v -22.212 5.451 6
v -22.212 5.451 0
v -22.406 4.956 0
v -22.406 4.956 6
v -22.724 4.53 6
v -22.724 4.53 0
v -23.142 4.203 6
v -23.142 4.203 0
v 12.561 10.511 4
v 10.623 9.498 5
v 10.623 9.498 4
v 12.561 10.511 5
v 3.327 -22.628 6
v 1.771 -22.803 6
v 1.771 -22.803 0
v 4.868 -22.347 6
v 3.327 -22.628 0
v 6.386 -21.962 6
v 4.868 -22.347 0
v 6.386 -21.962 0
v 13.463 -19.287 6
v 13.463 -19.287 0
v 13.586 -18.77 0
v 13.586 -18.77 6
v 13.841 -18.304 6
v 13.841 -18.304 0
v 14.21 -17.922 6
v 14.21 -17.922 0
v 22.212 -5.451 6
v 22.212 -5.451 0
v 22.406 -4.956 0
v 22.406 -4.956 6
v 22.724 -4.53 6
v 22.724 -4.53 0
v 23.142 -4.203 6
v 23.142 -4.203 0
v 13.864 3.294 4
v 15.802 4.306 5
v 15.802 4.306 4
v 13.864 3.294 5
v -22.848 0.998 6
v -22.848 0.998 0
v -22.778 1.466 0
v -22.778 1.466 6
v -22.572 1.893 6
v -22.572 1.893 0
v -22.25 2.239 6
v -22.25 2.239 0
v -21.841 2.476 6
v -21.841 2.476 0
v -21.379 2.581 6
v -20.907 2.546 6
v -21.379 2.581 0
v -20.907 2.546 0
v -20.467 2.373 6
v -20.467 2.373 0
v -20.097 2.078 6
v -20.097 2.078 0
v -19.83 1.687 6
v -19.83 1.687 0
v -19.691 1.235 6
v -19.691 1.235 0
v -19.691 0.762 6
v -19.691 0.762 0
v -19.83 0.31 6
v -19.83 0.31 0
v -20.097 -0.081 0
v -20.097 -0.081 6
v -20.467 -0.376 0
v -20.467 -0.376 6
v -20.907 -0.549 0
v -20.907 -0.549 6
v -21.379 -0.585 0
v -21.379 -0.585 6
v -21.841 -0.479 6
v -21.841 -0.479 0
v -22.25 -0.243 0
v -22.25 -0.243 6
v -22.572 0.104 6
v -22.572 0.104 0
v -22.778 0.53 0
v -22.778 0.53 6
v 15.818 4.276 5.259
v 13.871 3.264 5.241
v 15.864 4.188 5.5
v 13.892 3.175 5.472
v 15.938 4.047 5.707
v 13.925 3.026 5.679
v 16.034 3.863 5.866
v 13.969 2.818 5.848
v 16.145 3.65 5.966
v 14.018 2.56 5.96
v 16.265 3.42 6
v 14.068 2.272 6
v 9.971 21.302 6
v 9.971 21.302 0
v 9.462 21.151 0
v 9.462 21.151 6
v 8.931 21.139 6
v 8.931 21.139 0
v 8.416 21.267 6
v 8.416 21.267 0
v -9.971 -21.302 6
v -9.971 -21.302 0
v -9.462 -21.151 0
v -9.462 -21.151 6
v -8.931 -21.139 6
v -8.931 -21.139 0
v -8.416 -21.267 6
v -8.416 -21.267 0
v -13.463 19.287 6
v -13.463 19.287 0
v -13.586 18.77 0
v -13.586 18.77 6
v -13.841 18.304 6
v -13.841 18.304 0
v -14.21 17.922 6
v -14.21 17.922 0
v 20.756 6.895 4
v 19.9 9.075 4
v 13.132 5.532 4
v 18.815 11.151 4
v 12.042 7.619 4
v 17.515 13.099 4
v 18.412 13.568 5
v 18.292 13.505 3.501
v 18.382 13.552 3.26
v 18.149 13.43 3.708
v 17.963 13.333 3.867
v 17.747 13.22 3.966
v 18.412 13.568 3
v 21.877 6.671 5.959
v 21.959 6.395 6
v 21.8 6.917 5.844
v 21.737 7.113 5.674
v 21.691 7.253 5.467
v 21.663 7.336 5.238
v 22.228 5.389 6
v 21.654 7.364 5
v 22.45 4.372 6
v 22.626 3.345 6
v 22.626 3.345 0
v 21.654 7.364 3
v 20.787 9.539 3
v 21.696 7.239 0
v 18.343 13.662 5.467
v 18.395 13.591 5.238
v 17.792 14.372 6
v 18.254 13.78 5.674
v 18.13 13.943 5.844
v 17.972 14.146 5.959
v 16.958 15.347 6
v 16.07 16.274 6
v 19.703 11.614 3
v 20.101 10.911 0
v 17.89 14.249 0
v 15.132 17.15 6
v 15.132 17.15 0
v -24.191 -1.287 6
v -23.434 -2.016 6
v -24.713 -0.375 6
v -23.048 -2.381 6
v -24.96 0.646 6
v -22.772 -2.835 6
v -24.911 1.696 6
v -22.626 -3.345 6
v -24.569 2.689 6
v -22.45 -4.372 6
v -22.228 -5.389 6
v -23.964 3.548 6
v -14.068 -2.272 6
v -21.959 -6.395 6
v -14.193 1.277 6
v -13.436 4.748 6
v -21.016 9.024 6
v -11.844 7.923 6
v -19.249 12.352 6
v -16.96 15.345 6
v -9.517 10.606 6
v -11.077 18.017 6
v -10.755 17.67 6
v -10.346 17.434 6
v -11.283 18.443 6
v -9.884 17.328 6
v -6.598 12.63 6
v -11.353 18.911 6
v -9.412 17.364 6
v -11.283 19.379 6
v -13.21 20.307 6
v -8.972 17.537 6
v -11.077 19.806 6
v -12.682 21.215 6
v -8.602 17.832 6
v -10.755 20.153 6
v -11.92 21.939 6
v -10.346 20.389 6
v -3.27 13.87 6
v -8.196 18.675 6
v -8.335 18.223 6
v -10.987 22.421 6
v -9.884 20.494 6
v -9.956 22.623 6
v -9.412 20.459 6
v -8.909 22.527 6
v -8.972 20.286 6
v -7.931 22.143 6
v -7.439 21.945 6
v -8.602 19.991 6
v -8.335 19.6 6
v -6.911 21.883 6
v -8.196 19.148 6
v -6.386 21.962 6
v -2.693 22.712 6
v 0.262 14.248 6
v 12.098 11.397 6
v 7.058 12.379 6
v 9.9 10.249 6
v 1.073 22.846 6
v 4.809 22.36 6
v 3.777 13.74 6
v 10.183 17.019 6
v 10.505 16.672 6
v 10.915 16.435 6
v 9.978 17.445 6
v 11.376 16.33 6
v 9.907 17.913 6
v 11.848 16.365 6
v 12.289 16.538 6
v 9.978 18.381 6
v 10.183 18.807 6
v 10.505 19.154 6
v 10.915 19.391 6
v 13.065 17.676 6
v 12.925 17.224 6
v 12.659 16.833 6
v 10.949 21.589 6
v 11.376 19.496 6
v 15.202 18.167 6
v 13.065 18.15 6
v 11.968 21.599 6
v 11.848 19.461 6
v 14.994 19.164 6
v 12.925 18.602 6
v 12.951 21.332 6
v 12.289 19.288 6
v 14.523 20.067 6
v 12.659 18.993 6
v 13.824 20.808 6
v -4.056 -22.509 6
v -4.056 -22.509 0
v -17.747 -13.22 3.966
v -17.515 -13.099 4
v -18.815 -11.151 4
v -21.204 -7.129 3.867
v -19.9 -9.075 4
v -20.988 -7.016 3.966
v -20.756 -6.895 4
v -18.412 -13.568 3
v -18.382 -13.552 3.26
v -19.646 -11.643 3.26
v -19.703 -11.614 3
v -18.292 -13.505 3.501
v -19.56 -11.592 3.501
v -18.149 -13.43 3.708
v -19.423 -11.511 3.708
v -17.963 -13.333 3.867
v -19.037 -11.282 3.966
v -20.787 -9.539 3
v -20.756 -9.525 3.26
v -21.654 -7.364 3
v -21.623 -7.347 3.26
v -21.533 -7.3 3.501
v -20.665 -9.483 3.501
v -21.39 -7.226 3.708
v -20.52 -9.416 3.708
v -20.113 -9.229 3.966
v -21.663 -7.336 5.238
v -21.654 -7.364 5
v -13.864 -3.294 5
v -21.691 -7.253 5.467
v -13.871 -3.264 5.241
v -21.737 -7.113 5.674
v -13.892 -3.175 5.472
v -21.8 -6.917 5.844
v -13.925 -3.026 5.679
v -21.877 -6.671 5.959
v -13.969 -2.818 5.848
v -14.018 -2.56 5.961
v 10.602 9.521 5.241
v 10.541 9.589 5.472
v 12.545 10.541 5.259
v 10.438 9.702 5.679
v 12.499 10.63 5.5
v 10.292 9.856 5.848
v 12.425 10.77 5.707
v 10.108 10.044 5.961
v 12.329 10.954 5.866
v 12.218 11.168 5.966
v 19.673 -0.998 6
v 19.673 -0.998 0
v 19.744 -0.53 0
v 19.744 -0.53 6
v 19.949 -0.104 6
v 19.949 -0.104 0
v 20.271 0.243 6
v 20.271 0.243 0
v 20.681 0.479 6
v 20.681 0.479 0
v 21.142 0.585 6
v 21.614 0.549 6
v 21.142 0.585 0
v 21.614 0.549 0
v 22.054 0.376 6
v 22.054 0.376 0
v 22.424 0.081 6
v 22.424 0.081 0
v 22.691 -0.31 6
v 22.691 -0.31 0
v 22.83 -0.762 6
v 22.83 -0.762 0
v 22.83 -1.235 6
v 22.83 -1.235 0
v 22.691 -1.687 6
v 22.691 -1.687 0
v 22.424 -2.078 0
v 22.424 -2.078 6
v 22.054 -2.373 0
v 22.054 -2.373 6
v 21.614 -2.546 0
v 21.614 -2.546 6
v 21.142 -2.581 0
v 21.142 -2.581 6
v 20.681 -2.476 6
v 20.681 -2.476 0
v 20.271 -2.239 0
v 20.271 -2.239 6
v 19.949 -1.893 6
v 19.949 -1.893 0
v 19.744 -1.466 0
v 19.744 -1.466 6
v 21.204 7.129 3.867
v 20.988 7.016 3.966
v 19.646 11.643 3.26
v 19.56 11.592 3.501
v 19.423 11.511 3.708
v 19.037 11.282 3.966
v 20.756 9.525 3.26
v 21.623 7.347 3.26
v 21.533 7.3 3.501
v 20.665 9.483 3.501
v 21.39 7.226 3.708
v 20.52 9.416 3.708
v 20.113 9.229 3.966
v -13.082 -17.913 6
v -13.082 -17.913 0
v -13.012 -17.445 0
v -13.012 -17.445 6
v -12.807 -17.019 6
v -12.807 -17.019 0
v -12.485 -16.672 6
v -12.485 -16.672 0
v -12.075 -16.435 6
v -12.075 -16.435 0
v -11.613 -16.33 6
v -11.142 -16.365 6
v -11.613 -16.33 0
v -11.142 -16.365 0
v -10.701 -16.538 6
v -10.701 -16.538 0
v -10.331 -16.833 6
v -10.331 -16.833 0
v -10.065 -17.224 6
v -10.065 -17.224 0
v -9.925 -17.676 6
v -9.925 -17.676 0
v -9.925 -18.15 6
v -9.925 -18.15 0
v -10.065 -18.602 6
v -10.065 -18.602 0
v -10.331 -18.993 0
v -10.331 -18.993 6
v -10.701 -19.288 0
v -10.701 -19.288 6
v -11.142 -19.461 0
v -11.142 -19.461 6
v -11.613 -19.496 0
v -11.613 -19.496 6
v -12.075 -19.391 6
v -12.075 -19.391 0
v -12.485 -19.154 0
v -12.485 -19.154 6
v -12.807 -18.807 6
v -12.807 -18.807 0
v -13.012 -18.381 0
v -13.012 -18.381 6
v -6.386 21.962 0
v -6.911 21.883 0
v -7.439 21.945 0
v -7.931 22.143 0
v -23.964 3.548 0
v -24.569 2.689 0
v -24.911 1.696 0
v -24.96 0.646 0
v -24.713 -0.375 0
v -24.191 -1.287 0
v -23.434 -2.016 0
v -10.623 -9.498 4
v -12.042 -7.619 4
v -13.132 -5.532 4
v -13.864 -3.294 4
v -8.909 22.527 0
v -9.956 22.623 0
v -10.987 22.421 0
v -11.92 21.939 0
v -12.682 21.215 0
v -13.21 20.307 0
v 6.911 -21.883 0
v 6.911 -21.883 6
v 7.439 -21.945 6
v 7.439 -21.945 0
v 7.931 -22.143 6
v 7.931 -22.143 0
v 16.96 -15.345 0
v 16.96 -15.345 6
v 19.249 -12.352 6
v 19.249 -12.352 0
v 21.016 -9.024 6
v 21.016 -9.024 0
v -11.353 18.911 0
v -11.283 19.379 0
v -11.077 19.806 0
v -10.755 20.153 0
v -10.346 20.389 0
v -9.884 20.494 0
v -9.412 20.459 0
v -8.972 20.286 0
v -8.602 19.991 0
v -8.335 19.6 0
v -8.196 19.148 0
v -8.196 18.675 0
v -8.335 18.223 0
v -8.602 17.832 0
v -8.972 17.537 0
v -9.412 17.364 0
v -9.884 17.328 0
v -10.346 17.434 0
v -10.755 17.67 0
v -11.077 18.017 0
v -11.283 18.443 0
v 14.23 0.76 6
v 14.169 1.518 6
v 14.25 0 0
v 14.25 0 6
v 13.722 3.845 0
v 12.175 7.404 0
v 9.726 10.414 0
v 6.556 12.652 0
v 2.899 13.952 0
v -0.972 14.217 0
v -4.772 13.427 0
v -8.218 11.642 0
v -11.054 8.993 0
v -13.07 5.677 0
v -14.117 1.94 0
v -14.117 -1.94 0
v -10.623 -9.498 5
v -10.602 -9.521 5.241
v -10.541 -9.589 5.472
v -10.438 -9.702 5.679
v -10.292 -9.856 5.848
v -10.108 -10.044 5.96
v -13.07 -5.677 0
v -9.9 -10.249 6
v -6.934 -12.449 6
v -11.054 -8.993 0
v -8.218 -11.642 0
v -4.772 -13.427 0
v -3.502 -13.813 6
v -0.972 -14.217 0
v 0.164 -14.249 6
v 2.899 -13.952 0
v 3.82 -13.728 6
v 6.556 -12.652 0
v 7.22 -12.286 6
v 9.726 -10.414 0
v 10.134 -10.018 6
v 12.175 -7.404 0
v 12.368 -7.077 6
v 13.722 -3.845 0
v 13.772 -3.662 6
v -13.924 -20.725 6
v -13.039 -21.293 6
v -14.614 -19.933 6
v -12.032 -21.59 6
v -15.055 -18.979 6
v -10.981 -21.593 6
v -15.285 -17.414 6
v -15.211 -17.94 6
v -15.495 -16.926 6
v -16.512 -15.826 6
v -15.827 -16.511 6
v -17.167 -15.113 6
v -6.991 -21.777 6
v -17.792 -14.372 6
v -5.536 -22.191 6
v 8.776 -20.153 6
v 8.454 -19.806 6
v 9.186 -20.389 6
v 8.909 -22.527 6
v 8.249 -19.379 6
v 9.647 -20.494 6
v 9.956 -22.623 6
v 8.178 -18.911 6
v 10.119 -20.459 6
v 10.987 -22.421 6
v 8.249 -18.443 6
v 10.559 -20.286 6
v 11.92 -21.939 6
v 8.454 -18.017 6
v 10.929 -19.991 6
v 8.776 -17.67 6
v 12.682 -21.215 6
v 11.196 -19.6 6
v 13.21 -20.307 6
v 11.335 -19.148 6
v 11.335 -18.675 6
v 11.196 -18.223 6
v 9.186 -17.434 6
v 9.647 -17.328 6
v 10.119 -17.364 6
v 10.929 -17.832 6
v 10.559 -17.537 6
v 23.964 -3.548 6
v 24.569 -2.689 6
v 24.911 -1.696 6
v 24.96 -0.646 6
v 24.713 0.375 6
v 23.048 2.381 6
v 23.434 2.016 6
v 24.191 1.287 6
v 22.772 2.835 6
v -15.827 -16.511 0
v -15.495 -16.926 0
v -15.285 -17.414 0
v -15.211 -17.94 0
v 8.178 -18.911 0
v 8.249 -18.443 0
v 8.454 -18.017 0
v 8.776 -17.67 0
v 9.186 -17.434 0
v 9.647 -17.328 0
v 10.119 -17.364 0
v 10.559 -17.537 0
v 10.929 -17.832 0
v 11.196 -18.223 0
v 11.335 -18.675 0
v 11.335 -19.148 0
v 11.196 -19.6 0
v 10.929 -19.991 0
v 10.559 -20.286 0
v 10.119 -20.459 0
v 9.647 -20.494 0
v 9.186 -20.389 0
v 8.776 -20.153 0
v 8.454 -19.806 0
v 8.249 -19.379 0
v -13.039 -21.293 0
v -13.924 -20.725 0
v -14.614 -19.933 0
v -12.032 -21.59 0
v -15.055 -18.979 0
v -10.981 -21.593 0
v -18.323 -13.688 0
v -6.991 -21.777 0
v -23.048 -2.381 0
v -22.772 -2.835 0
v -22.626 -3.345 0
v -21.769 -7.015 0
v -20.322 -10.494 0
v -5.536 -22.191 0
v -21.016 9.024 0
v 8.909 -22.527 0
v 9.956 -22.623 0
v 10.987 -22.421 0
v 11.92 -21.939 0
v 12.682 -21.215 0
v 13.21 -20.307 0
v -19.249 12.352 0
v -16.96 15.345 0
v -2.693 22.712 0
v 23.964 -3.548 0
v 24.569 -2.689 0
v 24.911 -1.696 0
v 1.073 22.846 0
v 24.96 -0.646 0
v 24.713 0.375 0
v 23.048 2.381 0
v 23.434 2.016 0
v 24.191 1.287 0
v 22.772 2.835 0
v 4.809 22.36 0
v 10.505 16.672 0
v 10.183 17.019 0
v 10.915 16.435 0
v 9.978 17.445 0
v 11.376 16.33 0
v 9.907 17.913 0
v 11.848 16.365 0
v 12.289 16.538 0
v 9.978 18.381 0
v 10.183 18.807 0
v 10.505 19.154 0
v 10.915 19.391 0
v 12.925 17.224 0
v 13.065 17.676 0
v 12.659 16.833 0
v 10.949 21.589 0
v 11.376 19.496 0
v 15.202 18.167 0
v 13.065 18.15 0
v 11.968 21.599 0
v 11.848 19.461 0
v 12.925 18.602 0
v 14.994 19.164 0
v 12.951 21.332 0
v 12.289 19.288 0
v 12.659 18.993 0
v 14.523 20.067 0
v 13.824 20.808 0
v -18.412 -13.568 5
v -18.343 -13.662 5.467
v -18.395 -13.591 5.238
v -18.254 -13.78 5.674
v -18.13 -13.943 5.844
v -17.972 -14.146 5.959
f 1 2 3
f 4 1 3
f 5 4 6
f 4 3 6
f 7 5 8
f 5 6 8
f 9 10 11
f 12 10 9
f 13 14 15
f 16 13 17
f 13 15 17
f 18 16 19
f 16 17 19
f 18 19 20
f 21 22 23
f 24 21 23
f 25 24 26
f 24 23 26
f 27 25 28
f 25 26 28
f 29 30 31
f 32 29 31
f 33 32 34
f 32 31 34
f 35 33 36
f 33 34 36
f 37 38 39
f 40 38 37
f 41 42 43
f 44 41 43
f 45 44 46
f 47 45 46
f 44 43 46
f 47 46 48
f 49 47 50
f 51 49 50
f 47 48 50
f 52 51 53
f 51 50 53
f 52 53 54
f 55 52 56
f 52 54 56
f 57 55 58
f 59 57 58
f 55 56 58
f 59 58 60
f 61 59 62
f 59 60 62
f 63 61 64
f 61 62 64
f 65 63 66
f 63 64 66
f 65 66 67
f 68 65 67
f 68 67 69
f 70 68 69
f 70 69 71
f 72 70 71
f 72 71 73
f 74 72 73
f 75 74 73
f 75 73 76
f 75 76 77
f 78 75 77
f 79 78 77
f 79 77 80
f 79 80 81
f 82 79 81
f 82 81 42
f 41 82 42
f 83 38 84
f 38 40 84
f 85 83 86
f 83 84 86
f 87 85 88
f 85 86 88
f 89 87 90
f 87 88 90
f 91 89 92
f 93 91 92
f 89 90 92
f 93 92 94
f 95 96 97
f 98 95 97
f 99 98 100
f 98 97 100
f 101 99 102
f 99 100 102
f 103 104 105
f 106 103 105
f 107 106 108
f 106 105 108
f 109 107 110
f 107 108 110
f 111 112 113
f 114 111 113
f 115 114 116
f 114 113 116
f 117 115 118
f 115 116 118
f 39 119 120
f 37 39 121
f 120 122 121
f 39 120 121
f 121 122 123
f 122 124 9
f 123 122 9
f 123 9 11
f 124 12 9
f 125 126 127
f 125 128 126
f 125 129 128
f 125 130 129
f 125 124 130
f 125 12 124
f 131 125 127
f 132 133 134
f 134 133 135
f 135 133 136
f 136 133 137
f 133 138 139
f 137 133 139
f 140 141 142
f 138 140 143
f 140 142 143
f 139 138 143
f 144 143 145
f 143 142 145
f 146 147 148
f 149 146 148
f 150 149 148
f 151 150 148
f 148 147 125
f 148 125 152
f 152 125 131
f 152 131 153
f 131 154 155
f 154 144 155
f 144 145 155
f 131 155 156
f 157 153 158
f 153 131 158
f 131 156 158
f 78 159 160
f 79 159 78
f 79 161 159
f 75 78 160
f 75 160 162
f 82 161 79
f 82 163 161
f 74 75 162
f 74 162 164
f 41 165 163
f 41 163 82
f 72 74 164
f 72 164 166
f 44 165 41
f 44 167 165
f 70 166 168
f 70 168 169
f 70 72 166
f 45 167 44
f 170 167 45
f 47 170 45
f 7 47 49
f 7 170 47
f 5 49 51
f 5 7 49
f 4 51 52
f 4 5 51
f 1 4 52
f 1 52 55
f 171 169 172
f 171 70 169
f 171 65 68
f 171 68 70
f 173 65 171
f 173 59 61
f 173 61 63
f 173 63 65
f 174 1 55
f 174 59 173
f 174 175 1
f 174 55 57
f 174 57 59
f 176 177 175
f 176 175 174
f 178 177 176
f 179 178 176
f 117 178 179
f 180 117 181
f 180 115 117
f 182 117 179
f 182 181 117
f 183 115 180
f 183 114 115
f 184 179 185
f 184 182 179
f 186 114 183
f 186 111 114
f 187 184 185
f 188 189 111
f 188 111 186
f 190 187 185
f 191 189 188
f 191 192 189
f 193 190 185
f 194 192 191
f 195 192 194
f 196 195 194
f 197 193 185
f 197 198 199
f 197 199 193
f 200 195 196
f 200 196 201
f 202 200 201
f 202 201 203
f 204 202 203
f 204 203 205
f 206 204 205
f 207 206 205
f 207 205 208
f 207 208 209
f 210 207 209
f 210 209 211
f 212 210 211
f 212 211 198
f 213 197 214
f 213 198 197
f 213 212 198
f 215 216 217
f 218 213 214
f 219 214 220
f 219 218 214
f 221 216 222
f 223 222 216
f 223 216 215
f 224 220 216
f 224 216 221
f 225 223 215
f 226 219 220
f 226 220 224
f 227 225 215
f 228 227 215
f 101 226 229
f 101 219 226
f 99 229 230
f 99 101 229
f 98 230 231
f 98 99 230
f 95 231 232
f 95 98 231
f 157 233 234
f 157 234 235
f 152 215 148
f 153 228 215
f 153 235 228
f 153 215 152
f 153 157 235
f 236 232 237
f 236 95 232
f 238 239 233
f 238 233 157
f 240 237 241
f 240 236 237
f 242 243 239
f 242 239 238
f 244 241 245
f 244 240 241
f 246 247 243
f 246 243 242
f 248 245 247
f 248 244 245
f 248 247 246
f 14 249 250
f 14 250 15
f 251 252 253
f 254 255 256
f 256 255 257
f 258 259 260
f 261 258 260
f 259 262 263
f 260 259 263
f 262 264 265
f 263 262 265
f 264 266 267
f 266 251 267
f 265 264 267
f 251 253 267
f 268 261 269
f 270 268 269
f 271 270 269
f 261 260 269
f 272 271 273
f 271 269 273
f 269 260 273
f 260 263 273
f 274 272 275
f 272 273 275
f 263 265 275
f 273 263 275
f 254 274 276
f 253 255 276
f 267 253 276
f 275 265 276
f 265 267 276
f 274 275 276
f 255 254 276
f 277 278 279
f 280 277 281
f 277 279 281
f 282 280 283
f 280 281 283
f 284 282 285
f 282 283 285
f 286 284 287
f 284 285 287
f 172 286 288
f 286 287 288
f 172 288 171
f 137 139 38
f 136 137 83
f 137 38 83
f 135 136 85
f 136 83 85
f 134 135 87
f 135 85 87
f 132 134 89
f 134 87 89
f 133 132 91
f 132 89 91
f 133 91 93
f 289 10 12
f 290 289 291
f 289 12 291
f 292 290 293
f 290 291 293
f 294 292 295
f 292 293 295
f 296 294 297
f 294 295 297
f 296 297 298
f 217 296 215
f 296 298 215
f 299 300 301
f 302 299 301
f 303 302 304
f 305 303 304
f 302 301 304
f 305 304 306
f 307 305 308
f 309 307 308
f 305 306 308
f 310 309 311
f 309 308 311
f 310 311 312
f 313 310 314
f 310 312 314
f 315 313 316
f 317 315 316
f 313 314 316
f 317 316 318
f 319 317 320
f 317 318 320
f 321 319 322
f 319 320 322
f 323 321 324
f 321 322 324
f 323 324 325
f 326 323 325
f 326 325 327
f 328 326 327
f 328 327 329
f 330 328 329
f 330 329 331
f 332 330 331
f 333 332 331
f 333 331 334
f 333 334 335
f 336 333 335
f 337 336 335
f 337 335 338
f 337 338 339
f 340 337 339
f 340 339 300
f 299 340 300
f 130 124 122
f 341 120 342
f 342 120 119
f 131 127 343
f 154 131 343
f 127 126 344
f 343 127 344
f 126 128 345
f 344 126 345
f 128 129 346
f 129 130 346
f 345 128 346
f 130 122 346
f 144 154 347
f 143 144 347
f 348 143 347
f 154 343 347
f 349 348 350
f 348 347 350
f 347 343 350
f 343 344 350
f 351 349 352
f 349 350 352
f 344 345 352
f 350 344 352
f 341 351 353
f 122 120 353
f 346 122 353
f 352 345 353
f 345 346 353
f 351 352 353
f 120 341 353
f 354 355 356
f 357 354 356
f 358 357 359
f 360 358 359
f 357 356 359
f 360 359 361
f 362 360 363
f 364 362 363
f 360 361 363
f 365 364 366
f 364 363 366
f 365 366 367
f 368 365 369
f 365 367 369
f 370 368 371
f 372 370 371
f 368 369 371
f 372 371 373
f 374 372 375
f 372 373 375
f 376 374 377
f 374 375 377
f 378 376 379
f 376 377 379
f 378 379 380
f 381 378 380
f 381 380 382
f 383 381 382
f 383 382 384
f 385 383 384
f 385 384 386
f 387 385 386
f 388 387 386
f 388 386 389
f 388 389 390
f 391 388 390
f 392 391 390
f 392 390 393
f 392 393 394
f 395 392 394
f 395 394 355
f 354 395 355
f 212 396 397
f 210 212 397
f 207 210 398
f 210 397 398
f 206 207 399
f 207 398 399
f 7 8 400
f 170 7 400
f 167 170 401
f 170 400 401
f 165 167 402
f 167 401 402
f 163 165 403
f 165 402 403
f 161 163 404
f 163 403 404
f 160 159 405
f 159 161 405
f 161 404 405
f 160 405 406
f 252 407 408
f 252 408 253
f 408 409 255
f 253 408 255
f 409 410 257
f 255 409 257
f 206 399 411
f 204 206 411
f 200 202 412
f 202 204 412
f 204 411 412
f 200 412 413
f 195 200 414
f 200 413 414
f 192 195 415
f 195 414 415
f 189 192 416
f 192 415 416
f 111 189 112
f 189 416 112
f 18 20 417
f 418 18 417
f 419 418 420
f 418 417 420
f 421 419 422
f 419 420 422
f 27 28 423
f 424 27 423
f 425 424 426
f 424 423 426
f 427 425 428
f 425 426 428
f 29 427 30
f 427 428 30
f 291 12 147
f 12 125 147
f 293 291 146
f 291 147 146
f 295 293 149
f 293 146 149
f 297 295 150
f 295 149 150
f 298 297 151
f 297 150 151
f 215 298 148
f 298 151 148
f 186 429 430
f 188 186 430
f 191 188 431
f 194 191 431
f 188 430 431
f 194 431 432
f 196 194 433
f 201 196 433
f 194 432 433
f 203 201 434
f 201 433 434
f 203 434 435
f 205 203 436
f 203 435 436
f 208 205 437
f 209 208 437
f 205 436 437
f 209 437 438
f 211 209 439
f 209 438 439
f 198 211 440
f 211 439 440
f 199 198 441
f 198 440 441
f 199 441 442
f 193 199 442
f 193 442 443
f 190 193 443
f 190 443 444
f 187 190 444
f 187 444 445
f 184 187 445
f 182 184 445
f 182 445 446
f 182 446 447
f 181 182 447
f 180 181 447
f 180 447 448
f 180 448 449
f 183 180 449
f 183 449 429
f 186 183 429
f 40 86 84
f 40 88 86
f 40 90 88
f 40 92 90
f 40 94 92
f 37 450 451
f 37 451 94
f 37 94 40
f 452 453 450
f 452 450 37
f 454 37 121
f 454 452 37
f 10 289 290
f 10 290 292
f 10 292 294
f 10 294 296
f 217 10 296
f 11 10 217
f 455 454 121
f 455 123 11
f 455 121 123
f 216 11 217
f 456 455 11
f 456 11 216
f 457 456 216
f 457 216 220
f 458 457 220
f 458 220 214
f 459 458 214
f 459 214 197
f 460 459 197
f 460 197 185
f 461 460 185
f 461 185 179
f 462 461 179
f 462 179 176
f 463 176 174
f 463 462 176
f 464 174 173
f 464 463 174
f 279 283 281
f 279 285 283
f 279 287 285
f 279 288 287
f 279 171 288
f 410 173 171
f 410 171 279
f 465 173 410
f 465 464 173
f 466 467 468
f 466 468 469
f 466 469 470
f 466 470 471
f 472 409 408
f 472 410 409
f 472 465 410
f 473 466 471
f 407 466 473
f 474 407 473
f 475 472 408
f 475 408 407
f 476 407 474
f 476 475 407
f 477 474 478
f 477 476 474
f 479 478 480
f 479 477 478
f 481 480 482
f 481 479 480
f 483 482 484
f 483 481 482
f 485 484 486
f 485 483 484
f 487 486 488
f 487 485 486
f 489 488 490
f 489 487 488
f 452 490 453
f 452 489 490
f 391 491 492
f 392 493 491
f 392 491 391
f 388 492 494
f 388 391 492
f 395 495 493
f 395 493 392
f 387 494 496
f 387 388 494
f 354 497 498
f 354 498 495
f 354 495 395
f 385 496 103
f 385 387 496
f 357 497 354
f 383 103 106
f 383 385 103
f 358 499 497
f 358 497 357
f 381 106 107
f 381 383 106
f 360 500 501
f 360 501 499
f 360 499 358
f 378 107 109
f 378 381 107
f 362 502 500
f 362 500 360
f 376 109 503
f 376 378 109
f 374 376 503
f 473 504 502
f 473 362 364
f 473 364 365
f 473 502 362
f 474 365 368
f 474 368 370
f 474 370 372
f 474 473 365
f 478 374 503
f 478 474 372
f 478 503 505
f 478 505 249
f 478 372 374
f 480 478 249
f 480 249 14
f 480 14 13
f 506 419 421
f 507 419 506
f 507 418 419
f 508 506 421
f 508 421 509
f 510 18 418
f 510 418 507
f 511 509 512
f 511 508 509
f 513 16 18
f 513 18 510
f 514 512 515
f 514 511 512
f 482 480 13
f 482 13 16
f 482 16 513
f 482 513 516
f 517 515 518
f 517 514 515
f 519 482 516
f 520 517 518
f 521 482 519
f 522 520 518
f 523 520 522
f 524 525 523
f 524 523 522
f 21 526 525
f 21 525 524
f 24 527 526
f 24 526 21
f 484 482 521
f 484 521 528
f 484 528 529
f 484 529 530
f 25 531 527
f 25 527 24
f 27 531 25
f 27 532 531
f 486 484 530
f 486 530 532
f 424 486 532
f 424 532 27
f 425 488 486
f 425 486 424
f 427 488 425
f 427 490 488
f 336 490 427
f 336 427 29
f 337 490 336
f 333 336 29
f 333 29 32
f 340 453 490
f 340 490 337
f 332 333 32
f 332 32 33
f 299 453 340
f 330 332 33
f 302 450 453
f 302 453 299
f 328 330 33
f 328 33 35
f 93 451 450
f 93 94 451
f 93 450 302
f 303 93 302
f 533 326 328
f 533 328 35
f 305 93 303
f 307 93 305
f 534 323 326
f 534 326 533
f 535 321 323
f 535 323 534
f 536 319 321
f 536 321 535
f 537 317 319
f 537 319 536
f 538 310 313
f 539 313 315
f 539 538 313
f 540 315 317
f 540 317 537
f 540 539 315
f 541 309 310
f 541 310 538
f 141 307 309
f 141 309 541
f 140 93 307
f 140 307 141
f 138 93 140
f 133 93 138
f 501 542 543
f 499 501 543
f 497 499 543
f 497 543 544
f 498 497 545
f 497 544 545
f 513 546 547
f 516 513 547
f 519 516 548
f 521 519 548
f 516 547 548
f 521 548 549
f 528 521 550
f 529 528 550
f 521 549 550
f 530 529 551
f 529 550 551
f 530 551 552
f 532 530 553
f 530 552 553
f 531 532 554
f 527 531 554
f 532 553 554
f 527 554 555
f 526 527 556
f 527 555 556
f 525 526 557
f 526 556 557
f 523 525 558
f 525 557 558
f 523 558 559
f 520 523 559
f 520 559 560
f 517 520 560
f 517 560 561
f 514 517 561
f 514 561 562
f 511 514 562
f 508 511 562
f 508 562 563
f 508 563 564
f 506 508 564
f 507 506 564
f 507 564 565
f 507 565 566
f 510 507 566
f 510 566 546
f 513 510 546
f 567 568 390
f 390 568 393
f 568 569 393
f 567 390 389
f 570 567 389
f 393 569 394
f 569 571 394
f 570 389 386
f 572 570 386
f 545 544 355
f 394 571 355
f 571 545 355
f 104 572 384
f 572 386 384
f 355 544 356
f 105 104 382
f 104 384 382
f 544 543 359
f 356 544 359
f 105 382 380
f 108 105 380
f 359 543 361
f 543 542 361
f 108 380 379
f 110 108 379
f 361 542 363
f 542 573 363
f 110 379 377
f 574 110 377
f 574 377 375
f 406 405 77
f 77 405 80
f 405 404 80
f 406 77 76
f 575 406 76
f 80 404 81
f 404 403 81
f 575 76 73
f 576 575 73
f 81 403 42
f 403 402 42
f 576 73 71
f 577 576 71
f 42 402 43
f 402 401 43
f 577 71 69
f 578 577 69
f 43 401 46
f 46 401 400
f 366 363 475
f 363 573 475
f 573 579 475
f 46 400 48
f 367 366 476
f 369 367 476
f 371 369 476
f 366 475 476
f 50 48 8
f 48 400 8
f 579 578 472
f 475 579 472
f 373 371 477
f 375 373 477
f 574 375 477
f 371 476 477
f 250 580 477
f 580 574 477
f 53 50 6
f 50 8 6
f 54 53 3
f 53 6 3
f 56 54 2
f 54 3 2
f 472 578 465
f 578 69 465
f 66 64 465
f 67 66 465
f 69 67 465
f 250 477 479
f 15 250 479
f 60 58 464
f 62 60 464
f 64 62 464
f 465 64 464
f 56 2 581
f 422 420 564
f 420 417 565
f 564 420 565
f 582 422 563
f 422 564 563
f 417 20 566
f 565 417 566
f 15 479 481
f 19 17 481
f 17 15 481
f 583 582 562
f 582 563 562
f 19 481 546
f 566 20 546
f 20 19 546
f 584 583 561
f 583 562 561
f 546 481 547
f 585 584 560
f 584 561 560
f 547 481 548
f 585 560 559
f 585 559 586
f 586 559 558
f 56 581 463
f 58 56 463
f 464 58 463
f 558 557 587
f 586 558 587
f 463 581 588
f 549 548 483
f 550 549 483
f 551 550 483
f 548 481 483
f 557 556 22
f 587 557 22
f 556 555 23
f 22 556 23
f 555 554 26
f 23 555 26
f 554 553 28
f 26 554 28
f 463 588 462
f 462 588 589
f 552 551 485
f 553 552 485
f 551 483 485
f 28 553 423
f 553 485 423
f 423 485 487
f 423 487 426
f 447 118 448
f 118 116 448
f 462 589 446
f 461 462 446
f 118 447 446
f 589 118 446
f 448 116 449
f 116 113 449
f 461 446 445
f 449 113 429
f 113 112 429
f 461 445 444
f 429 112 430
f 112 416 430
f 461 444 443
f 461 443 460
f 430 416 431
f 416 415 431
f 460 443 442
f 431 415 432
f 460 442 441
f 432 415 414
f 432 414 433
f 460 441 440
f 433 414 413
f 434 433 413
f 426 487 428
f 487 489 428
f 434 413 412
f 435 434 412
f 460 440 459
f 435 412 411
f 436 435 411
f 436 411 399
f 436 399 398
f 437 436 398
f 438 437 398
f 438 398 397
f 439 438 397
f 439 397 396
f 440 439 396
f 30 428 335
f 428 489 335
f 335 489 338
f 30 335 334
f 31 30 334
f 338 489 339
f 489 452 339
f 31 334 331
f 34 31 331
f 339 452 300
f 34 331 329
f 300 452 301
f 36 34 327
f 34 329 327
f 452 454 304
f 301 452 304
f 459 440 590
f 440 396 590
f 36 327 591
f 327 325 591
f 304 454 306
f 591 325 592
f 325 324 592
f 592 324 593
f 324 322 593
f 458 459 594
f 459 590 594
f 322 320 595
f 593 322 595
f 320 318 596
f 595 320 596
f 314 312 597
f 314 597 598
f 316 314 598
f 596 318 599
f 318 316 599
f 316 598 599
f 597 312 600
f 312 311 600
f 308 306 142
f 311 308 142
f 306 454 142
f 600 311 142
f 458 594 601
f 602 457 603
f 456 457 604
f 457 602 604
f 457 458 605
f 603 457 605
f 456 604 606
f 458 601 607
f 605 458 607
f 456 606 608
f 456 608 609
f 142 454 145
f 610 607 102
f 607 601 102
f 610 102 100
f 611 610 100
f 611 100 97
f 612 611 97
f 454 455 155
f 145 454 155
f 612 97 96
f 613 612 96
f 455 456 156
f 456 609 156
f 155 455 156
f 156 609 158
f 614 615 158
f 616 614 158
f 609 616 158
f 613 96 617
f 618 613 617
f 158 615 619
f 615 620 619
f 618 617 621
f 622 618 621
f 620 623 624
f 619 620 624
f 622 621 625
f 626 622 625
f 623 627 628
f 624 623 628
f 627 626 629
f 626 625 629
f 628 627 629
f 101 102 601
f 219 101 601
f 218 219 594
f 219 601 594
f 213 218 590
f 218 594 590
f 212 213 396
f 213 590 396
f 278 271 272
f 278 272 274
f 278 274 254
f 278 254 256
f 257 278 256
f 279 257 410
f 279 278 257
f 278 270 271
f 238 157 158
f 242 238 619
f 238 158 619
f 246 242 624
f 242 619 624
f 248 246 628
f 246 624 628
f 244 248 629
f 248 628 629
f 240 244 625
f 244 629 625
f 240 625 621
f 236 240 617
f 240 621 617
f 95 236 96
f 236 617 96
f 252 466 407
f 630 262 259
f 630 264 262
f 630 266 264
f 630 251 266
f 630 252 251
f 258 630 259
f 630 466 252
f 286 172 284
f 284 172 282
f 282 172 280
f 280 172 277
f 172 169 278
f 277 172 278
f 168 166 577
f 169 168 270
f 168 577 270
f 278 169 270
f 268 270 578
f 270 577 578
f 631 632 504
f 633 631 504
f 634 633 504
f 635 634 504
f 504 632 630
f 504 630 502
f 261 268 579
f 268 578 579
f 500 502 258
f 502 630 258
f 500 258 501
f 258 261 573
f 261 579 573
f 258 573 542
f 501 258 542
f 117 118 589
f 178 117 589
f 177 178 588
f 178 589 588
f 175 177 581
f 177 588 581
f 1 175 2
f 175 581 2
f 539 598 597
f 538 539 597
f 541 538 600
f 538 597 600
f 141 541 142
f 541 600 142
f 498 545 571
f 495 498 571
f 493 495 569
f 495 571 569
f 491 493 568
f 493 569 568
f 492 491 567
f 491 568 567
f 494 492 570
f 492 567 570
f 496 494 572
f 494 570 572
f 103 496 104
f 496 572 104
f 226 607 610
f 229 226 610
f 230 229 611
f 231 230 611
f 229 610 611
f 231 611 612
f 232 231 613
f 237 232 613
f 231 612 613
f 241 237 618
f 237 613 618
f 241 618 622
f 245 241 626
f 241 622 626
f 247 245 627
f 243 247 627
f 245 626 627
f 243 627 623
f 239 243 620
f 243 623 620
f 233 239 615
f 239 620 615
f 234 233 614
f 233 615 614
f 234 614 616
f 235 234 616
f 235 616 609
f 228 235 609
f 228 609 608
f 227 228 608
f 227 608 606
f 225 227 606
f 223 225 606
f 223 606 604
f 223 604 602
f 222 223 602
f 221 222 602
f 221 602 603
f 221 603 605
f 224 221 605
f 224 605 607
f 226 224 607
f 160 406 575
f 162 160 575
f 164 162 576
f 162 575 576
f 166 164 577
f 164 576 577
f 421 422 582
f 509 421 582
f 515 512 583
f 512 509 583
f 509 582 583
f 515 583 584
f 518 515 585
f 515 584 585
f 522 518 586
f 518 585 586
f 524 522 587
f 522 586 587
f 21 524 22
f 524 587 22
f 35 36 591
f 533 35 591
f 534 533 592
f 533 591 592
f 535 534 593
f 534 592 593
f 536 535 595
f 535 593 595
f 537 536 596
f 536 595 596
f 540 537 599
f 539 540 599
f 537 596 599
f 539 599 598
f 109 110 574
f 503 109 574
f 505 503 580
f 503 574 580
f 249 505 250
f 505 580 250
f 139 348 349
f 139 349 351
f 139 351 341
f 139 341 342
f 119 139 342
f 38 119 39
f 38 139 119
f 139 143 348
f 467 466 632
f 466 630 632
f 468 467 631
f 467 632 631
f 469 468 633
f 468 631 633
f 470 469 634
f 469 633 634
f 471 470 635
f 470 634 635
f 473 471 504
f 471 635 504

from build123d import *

# Parameters (mm, degrees)
SKETCH1_R           = 25
SKETCH1_R_2         = 14.25
BOSS_EXTRUDE1_DEPTH = 6
CUT_EXTRUDE1_REACH  = 8
CUT_EXTRUDE2_REACH  = 8
SKETCH3_R           = 1.5875
CUT_EXTRUDE3_DEPTH  = 2
CUT_EXTRUDE4_START  = -6.000001
SKETCH5_R           = 41.768296762
CUT_EXTRUDE4_DEPTH  = 6.000001
FILLET1_R           = 1


with BuildPart() as part:
    # Sketch1 → Boss-Extrude1 (new body)
    with BuildSketch(Plane.XY):
        Circle(SKETCH1_R)
        Circle(SKETCH1_R_2, mode=Mode.SUBTRACT)
    extrude(amount=BOSS_EXTRUDE1_DEPTH)

    # Sketch2 → Cut-Extrude1 (cut, up to next)
    with BuildSketch(Plane.XY.offset(6), mode=Mode.PRIVATE) as cut_extrude1_sk1:
        with BuildLine():
            Line((-11.636735818, -22.126598914), (9.351350952, -23.185172748))
            ThreePointArc((9.351350952, -23.185172748), (-1.259321499, -24.968262041), (-11.636735818, -22.126598914))
        make_face()
    cut_extrude1_tool1 = extrude(cut_extrude1_sk1.sketch, amount=-CUT_EXTRUDE1_REACH, mode=Mode.PRIVATE) & part.part
    add(cut_extrude1_tool1.solids().sort_by_distance((-1.189534, -23.584609, 6))[0], mode=Mode.SUBTRACT)

    # Sketch3 → Cut-Extrude2 (cut, up to next)
    with BuildSketch(Plane(origin=(0, 0, 0), x_dir=(-1, 0, 0), z_dir=(0, 0, -1)), mode=Mode.PRIVATE) as cut_extrude2_sk1:
        with Locations((11.49485864, -17.913013938)):
            Circle(SKETCH3_R)
    cut_extrude2_tool1 = extrude(cut_extrude2_sk1.sketch, amount=-CUT_EXTRUDE2_REACH, mode=Mode.PRIVATE) & part.part
    add(cut_extrude2_tool1.solids().sort_by_distance((-11.494859, -17.913014, 0))[0], mode=Mode.SUBTRACT)
    # Sketch3 → Cut-Extrude2 (cut, up to next)
    with BuildSketch(Plane(origin=(0, 0, 0), x_dir=(-1, 0, 0), z_dir=(0, 0, -1)), mode=Mode.PRIVATE) as cut_extrude2_sk2:
        with Locations((21.260554449, 0.998332626)):
            Circle(SKETCH3_R)
    cut_extrude2_tool2 = extrude(cut_extrude2_sk2.sketch, amount=-CUT_EXTRUDE2_REACH, mode=Mode.PRIVATE) & part.part
    add(cut_extrude2_tool2.solids().sort_by_distance((-21.260554, 0.998333, 0))[0], mode=Mode.SUBTRACT)
    # Sketch3 → Cut-Extrude2 (cut, up to next)
    with BuildSketch(Plane(origin=(0, 0, 0), x_dir=(-1, 0, 0), z_dir=(0, 0, -1)), mode=Mode.PRIVATE) as cut_extrude2_sk3:
        with Locations((9.765695809, 18.911346564)):
            Circle(SKETCH3_R)
    cut_extrude2_tool3 = extrude(cut_extrude2_sk3.sketch, amount=-CUT_EXTRUDE2_REACH, mode=Mode.PRIVATE) & part.part
    add(cut_extrude2_tool3.solids().sort_by_distance((-9.765696, 18.911347, 0))[0], mode=Mode.SUBTRACT)
    # Sketch3 → Cut-Extrude2 (cut, up to next)
    with BuildSketch(Plane(origin=(0, 0, 0), x_dir=(-1, 0, 0), z_dir=(0, 0, -1)), mode=Mode.PRIVATE) as cut_extrude2_sk4:
        with Locations((-11.49485864, 17.913013938)):
            Circle(SKETCH3_R)
    cut_extrude2_tool4 = extrude(cut_extrude2_sk4.sketch, amount=-CUT_EXTRUDE2_REACH, mode=Mode.PRIVATE) & part.part
    add(cut_extrude2_tool4.solids().sort_by_distance((11.494859, 17.913014, 0))[0], mode=Mode.SUBTRACT)
    # Sketch3 → Cut-Extrude2 (cut, up to next)
    with BuildSketch(Plane(origin=(0, 0, 0), x_dir=(-1, 0, 0), z_dir=(0, 0, -1)), mode=Mode.PRIVATE) as cut_extrude2_sk5:
        with Locations((-21.260554449, -0.998332626)):
            Circle(SKETCH3_R)
    cut_extrude2_tool5 = extrude(cut_extrude2_sk5.sketch, amount=-CUT_EXTRUDE2_REACH, mode=Mode.PRIVATE) & part.part
    add(cut_extrude2_tool5.solids().sort_by_distance((21.260554, -0.998333, 0))[0], mode=Mode.SUBTRACT)
    # Sketch3 → Cut-Extrude2 (cut, up to next)
    with BuildSketch(Plane(origin=(0, 0, 0), x_dir=(-1, 0, 0), z_dir=(0, 0, -1)), mode=Mode.PRIVATE) as cut_extrude2_sk6:
        with Locations((-9.765695809, -18.911346564)):
            Circle(SKETCH3_R)
    cut_extrude2_tool6 = extrude(cut_extrude2_sk6.sketch, amount=-CUT_EXTRUDE2_REACH, mode=Mode.PRIVATE) & part.part
    add(cut_extrude2_tool6.solids().sort_by_distance((9.765696, -18.911347, 0))[0], mode=Mode.SUBTRACT)

    # Sketch4 → Cut-Extrude3 (cut)
    with BuildSketch(Plane.XY.offset(6)):
        Polygon((12.56074277, 10.510839218), (35.025911551, 22.247124987), (38.267200626, 16.04276804), (15.802031846, 4.306482271), (-51.191313487, -30.692277506), (-54.432602563, -24.487920559), align=None)
    extrude(amount=-CUT_EXTRUDE3_DEPTH, mode=Mode.SUBTRACT)

    # Sketch5 → Cut-Extrude4 (cut)
    with BuildSketch(Plane.XY.offset(6).offset(CUT_EXTRUDE4_START)):
        Circle(SKETCH5_R)
        with BuildLine():
            ThreePointArc((-7.9313675, 22.143070177), (-11.470711058, 22.213121974), (-13.462706849, 19.286722677))
            ThreePointArc((-13.462706849, 19.286722677), (-13.698075607, 18.528505361), (-14.209890558, 17.921597291))
            ThreePointArc((-14.209890558, 17.921597291), (-19.249084936, 12.352221187), (-22.212464402, 5.450785662))
            ThreePointArc((-22.212464402, 5.450785662), (-22.550939275, 4.732644513), (-23.142145042, 4.202769347))
            ThreePointArc((-23.142145042, 4.202769347), (-24.972483456, 1.172633811), (-23.434145218, -2.015684796))
            ThreePointArc((-23.434145218, -2.015684796), (-22.89519414, -2.598628778), (-22.62550381, -3.345327563))
            ThreePointArc((-22.62550381, -3.345327563), (-20.32187981, -10.494085961), (-15.826751055, -16.511165622))
            ThreePointArc((-15.826751055, -16.511165622), (-15.374060012, -17.163364035), (-15.210777541, -17.940300831))
            ThreePointArc((-15.210777541, -17.940300831), (-13.501772398, -21.040488163), (-9.97143837, -21.302407473))
            ThreePointArc((-9.97143837, -21.302407473), (-9.197118534, -21.127134139), (-8.415613251, -21.266924854))
            ThreePointArc((-8.415613251, -21.266924854), (-1.072794873, -22.846307148), (6.385713347, -21.961951284))
            ThreePointArc((6.385713347, -21.961951284), (7.176879262, -21.896008547), (7.9313675, -22.143070177))
            ThreePointArc((7.9313675, -22.143070177), (11.470711058, -22.213121974), (13.462706849, -19.286722677))
            ThreePointArc((13.462706849, -19.286722677), (13.698075607, -18.528505361), (14.209890558, -17.921597291))
            ThreePointArc((14.209890558, -17.921597291), (19.249084936, -12.352221187), (22.212464402, -5.450785662))
            ThreePointArc((22.212464402, -5.450785662), (22.550939275, -4.732644513), (23.142145042, -4.202769347))
            ThreePointArc((23.142145042, -4.202769347), (24.972483456, -1.172633811), (23.434145218, 2.015684796))
            ThreePointArc((23.434145218, 2.015684796), (22.89519414, 2.598628778), (22.62550381, 3.345327563))
            ThreePointArc((22.62550381, 3.345327563), (20.100933566, 10.911329384), (15.131770312, 17.150340124))
            ThreePointArc((15.131770312, 17.150340124), (13.824370884, 20.808211783), (9.97143837, 21.302407473))
            ThreePointArc((9.97143837, 21.302407473), (9.197118534, 21.127134139), (8.415613251, 21.266924854))
            ThreePointArc((8.415613251, 21.266924854), (1.072794873, 22.846307148), (-6.385713347, 21.961951284))
            ThreePointArc((-6.385713347, 21.961951284), (-7.176879262, 21.896008547), (-7.9313675, 22.143070177))
        make_face(mode=Mode.SUBTRACT)
    extrude(amount=CUT_EXTRUDE4_DEPTH, mode=Mode.SUBTRACT)

    # Fillet1
    fillet1_edges = [part.edges().sort_by_distance(p)[0] for p in [
        (-14.517589627, -11.533137966, 6),
        (-20.271833071, -10.590440175, 4),
        (14.517589627, 11.533137966, 6),
        (20.271833071, 10.590440175, 4),
        (17.758878703, 5.328781019, 6),
        (-17.758878703, -5.328781019, 6),
    ]]
    fillet(fillet1_edges, radius=FILLET1_R)


solid = part.part
